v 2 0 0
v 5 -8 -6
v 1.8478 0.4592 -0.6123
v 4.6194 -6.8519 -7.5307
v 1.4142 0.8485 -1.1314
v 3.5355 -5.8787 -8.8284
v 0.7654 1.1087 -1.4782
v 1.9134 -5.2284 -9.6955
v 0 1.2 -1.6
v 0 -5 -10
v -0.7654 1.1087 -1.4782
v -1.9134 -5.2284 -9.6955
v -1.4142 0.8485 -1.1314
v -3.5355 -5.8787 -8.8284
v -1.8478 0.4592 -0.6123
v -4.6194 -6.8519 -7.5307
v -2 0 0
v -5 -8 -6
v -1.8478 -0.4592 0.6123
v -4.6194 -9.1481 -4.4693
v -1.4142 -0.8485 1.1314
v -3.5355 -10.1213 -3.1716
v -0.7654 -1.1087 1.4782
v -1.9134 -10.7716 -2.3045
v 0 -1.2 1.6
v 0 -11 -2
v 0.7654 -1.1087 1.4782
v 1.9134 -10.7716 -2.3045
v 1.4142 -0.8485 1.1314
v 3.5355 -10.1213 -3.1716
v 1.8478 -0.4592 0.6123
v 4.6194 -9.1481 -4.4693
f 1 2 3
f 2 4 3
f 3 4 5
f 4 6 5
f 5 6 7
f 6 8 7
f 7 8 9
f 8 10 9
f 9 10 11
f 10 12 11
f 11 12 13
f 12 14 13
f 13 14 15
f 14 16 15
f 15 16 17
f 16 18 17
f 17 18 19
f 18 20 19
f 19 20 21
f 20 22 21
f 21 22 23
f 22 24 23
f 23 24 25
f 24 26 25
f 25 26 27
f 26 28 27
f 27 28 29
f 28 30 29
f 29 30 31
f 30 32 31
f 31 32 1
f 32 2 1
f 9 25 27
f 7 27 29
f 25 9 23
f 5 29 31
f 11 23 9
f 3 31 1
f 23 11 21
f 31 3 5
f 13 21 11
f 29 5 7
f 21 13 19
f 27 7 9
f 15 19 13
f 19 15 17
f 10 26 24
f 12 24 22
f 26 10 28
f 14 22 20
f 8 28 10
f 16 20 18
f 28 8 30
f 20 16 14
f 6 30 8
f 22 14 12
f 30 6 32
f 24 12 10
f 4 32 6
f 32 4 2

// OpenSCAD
mirror([0, 5, 10]) cylinder(h=10, r1=2, r2=5);

%cylinder(h=10, r1=2, r2=5);
